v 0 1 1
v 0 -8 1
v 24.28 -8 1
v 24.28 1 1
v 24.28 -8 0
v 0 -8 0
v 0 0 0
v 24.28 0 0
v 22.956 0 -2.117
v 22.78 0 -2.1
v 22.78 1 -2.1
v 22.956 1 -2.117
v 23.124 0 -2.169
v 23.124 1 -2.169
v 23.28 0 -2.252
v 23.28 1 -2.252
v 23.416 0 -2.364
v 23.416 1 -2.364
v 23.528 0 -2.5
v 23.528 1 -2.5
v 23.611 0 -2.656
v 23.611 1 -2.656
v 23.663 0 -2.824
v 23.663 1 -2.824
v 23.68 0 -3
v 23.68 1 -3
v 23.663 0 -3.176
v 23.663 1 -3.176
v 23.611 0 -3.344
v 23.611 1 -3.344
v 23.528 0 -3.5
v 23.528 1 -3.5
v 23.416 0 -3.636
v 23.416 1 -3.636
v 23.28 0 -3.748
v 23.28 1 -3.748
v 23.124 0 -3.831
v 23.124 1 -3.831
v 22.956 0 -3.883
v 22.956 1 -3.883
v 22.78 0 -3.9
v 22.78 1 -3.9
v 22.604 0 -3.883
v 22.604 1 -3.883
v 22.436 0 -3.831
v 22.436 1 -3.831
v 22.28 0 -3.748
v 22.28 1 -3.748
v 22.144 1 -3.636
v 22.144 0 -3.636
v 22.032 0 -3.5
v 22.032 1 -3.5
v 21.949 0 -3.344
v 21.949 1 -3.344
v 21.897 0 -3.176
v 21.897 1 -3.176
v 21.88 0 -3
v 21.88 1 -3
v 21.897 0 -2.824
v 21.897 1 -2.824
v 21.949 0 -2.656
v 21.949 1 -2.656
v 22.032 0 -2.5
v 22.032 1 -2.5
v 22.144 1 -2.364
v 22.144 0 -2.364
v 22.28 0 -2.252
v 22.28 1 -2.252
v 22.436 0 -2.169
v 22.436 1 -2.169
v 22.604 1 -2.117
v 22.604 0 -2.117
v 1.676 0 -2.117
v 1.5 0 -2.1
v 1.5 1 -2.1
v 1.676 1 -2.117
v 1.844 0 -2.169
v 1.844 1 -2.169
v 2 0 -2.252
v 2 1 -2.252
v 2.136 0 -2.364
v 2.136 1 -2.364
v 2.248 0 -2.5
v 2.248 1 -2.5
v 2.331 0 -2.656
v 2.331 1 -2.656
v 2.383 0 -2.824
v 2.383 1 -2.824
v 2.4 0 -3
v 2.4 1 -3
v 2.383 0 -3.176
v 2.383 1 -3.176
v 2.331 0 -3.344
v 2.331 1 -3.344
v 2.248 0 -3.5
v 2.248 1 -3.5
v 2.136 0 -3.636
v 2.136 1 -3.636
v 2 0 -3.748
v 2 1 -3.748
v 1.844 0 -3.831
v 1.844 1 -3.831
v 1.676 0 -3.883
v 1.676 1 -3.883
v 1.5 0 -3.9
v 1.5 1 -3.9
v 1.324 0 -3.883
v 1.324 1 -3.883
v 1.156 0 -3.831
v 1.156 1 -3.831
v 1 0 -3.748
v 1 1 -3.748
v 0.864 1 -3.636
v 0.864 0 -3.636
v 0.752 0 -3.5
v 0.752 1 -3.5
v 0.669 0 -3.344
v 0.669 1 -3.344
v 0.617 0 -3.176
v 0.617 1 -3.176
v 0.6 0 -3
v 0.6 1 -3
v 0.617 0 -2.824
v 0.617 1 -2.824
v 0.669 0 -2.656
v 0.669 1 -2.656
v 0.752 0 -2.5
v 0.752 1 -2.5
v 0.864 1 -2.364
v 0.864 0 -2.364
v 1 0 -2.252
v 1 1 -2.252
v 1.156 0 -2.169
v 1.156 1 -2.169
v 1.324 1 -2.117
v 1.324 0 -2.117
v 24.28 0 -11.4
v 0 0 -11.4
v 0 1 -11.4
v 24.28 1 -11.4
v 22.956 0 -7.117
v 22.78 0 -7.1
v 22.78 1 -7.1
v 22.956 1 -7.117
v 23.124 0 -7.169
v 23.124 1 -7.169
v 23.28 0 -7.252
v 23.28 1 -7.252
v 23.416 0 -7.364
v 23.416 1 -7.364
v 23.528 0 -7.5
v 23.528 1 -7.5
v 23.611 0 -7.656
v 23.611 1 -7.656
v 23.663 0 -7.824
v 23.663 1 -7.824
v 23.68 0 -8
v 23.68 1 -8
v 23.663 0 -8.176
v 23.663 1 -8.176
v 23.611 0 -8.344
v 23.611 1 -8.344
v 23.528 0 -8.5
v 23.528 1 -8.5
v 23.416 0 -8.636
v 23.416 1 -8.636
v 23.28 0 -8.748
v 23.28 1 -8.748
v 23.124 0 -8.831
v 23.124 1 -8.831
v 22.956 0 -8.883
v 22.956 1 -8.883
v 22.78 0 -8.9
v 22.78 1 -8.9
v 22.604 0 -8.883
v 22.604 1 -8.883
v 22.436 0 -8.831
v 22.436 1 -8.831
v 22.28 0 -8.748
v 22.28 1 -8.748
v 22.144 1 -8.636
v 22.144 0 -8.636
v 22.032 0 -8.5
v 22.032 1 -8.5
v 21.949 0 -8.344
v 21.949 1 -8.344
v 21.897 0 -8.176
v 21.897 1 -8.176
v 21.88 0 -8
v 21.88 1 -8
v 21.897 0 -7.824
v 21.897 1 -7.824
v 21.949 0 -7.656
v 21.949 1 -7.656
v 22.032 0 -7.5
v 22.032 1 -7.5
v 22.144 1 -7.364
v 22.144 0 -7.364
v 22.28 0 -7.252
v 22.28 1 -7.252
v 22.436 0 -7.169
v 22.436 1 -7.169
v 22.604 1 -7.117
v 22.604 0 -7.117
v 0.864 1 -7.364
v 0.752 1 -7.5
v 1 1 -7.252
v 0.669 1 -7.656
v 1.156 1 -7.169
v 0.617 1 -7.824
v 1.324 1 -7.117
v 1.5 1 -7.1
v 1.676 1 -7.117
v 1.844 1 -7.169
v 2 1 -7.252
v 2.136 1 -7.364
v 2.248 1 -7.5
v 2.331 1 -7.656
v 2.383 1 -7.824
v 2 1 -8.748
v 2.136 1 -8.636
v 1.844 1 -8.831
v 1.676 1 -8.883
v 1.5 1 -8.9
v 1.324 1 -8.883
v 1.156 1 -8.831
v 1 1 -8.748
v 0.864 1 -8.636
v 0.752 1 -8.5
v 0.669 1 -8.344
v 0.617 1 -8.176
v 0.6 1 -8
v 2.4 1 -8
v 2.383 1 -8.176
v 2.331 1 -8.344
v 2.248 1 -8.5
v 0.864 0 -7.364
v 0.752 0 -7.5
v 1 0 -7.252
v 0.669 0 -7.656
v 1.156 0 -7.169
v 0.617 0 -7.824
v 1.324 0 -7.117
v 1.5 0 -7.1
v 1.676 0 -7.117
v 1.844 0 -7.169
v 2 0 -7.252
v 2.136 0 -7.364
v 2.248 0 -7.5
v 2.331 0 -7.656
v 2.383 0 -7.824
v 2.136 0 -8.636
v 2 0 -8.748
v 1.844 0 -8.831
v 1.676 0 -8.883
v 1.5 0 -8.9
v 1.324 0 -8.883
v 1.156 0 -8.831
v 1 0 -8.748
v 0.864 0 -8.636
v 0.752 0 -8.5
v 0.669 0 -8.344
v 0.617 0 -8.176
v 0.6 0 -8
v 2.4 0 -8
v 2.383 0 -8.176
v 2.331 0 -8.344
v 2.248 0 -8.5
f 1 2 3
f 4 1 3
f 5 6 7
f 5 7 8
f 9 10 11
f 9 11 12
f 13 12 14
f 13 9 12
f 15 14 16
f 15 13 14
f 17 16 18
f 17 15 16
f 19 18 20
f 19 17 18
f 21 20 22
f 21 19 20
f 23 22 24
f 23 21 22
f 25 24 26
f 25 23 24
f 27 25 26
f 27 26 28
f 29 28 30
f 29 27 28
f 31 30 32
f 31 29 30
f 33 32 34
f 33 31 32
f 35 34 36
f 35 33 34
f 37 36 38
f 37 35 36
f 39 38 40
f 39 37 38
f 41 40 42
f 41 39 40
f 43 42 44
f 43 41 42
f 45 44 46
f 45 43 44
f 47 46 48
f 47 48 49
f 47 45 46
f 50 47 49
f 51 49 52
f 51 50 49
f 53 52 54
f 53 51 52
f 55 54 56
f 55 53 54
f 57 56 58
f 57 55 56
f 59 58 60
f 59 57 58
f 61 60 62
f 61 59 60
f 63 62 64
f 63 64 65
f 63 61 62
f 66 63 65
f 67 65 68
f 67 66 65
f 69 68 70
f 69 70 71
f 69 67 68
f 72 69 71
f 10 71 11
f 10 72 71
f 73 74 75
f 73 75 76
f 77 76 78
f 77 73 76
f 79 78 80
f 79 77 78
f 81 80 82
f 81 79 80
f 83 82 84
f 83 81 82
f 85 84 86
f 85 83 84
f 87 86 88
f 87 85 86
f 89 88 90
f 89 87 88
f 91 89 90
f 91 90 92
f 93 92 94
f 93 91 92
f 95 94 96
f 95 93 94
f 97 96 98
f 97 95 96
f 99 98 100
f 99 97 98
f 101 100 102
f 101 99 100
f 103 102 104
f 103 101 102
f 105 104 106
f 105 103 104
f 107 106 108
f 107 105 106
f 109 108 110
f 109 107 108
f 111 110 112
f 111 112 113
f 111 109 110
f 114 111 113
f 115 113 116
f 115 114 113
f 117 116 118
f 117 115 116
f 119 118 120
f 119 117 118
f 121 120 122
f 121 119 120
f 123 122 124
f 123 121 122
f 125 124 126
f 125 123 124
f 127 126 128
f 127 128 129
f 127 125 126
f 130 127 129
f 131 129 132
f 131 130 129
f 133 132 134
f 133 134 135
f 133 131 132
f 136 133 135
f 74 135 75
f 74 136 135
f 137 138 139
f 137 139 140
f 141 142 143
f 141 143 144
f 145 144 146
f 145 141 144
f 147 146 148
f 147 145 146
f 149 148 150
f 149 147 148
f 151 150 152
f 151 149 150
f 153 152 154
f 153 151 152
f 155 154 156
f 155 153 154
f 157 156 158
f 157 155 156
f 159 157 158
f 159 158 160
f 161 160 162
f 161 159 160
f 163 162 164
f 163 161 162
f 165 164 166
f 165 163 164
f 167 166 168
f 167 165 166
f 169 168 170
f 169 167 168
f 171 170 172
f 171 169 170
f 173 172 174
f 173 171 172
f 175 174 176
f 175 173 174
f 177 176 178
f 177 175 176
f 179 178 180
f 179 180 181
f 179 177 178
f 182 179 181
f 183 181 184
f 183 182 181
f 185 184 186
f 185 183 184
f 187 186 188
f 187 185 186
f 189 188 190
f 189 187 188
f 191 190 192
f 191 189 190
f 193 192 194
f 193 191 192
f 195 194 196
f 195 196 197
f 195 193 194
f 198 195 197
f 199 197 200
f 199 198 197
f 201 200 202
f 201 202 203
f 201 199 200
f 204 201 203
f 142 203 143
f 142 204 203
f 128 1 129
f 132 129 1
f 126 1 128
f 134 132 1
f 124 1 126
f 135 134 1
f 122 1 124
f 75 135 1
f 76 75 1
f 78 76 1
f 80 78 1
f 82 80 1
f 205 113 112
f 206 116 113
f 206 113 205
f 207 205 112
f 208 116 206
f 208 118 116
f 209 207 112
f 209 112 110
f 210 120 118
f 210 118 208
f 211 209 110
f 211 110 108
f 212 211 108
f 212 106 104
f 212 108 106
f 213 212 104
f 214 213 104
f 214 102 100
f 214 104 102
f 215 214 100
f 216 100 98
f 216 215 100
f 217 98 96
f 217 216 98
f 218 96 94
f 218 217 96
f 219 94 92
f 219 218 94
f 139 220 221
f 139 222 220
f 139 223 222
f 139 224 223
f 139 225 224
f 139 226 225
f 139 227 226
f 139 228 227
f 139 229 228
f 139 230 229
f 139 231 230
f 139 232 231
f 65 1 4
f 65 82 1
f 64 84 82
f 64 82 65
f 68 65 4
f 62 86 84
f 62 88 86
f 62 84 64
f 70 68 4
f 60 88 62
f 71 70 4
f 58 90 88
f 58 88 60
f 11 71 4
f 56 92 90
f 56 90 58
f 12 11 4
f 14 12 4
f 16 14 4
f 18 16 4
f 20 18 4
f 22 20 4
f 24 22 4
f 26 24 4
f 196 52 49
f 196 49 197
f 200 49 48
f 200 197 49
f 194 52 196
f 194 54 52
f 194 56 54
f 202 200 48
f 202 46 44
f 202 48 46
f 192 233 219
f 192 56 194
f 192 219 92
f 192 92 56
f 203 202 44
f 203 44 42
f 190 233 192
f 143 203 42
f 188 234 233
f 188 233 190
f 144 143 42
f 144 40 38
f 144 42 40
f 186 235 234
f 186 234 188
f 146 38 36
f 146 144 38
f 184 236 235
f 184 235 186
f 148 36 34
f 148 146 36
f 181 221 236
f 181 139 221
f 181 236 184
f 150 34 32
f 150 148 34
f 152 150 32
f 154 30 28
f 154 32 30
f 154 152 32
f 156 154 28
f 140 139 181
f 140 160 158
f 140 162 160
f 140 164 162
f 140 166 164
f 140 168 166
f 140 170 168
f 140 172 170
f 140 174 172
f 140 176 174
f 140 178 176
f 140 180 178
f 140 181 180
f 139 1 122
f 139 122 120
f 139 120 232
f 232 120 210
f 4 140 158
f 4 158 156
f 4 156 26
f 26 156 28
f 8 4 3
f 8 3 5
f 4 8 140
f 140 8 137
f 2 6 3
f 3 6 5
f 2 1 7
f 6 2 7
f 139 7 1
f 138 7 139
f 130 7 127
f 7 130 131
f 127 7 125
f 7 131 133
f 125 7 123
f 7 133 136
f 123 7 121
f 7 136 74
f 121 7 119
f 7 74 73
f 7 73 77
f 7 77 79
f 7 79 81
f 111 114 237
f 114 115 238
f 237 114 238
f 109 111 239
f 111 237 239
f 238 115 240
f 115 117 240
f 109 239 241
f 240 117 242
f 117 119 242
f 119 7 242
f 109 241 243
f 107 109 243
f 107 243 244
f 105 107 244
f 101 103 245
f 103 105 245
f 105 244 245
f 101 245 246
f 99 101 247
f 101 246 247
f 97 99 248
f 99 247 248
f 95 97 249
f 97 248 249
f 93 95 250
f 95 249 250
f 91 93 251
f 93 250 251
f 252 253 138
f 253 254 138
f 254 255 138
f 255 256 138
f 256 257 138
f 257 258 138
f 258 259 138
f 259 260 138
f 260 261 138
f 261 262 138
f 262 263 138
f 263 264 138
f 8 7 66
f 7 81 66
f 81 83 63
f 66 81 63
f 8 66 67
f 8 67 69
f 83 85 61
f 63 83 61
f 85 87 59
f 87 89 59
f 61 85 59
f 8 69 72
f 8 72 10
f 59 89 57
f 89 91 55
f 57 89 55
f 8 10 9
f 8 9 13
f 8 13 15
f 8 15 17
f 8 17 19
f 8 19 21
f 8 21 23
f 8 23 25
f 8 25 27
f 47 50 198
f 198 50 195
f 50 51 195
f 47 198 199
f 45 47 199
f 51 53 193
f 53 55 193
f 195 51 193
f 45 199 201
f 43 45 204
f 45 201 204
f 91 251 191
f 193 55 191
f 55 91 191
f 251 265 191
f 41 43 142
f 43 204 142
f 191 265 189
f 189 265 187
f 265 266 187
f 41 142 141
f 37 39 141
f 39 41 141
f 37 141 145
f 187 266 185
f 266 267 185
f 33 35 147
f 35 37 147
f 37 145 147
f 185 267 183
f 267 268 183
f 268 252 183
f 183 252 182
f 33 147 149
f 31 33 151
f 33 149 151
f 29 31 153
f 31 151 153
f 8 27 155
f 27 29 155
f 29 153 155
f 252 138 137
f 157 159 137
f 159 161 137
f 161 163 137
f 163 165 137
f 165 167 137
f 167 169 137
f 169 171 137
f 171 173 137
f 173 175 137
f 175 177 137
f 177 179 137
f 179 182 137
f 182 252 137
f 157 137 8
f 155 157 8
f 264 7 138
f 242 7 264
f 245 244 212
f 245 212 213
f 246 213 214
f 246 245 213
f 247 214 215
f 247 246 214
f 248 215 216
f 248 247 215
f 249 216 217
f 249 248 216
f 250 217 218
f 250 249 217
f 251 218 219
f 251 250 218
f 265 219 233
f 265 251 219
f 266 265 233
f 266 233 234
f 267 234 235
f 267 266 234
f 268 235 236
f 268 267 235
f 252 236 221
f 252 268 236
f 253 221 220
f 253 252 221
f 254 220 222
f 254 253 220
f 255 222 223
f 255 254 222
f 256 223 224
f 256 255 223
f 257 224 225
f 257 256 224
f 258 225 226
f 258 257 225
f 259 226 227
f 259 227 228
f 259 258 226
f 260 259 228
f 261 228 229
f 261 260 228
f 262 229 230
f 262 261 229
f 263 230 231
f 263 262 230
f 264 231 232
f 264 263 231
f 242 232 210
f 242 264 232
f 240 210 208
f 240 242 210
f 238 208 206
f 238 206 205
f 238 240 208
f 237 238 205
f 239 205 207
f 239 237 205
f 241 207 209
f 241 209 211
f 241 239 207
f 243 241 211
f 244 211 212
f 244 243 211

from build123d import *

# Parameters (mm, degrees)
SKETCH1_W                = 24.28
SKETCH1_H                = 11.4
SKETCH1_R                = 0.9
BOSS_EXTRUDE1_DEPTH      = 1
BOSS_EXTRUDE2_DEPTH      = 1
BOSS_EXTRUDE2_DEPTH_BACK = 8
SKETCH1_3_W              = 24.28
SKETCH1_3_H              = 1


with BuildPart() as part:
    # Sketch1 → Boss-Extrude1 (new body)
    with BuildSketch(Plane(origin=(0, 0, 0), x_dir=(1, 0, 0), z_dir=(0, 1, 0))):
        with Locations((12.14, 5.7)):
            Rectangle(SKETCH1_W, SKETCH1_H)
        with Locations((22.78, 3)):
            Circle(SKETCH1_R, mode=Mode.SUBTRACT)
        with Locations((22.78, 8)):
            Circle(SKETCH1_R, mode=Mode.SUBTRACT)
        with Locations((1.5, 8)):
            Circle(SKETCH1_R, mode=Mode.SUBTRACT)
        with Locations((1.5, 3)):
            Circle(SKETCH1_R, mode=Mode.SUBTRACT)
    extrude(amount=BOSS_EXTRUDE1_DEPTH)

    # Sketch1<3> → Boss-Extrude2 (add, two sides: drawn at the far end of the back side and taken through both)
    with BuildSketch(Plane(origin=(0, 0, 0), x_dir=(1, 0, 0), z_dir=(0, 1, 0)).offset(-BOSS_EXTRUDE2_DEPTH_BACK)):
        with Locations((12.14, -0.5)):
            Rectangle(SKETCH1_3_W, SKETCH1_3_H)
    extrude(amount=BOSS_EXTRUDE2_DEPTH + BOSS_EXTRUDE2_DEPTH_BACK)


solid = part.part
